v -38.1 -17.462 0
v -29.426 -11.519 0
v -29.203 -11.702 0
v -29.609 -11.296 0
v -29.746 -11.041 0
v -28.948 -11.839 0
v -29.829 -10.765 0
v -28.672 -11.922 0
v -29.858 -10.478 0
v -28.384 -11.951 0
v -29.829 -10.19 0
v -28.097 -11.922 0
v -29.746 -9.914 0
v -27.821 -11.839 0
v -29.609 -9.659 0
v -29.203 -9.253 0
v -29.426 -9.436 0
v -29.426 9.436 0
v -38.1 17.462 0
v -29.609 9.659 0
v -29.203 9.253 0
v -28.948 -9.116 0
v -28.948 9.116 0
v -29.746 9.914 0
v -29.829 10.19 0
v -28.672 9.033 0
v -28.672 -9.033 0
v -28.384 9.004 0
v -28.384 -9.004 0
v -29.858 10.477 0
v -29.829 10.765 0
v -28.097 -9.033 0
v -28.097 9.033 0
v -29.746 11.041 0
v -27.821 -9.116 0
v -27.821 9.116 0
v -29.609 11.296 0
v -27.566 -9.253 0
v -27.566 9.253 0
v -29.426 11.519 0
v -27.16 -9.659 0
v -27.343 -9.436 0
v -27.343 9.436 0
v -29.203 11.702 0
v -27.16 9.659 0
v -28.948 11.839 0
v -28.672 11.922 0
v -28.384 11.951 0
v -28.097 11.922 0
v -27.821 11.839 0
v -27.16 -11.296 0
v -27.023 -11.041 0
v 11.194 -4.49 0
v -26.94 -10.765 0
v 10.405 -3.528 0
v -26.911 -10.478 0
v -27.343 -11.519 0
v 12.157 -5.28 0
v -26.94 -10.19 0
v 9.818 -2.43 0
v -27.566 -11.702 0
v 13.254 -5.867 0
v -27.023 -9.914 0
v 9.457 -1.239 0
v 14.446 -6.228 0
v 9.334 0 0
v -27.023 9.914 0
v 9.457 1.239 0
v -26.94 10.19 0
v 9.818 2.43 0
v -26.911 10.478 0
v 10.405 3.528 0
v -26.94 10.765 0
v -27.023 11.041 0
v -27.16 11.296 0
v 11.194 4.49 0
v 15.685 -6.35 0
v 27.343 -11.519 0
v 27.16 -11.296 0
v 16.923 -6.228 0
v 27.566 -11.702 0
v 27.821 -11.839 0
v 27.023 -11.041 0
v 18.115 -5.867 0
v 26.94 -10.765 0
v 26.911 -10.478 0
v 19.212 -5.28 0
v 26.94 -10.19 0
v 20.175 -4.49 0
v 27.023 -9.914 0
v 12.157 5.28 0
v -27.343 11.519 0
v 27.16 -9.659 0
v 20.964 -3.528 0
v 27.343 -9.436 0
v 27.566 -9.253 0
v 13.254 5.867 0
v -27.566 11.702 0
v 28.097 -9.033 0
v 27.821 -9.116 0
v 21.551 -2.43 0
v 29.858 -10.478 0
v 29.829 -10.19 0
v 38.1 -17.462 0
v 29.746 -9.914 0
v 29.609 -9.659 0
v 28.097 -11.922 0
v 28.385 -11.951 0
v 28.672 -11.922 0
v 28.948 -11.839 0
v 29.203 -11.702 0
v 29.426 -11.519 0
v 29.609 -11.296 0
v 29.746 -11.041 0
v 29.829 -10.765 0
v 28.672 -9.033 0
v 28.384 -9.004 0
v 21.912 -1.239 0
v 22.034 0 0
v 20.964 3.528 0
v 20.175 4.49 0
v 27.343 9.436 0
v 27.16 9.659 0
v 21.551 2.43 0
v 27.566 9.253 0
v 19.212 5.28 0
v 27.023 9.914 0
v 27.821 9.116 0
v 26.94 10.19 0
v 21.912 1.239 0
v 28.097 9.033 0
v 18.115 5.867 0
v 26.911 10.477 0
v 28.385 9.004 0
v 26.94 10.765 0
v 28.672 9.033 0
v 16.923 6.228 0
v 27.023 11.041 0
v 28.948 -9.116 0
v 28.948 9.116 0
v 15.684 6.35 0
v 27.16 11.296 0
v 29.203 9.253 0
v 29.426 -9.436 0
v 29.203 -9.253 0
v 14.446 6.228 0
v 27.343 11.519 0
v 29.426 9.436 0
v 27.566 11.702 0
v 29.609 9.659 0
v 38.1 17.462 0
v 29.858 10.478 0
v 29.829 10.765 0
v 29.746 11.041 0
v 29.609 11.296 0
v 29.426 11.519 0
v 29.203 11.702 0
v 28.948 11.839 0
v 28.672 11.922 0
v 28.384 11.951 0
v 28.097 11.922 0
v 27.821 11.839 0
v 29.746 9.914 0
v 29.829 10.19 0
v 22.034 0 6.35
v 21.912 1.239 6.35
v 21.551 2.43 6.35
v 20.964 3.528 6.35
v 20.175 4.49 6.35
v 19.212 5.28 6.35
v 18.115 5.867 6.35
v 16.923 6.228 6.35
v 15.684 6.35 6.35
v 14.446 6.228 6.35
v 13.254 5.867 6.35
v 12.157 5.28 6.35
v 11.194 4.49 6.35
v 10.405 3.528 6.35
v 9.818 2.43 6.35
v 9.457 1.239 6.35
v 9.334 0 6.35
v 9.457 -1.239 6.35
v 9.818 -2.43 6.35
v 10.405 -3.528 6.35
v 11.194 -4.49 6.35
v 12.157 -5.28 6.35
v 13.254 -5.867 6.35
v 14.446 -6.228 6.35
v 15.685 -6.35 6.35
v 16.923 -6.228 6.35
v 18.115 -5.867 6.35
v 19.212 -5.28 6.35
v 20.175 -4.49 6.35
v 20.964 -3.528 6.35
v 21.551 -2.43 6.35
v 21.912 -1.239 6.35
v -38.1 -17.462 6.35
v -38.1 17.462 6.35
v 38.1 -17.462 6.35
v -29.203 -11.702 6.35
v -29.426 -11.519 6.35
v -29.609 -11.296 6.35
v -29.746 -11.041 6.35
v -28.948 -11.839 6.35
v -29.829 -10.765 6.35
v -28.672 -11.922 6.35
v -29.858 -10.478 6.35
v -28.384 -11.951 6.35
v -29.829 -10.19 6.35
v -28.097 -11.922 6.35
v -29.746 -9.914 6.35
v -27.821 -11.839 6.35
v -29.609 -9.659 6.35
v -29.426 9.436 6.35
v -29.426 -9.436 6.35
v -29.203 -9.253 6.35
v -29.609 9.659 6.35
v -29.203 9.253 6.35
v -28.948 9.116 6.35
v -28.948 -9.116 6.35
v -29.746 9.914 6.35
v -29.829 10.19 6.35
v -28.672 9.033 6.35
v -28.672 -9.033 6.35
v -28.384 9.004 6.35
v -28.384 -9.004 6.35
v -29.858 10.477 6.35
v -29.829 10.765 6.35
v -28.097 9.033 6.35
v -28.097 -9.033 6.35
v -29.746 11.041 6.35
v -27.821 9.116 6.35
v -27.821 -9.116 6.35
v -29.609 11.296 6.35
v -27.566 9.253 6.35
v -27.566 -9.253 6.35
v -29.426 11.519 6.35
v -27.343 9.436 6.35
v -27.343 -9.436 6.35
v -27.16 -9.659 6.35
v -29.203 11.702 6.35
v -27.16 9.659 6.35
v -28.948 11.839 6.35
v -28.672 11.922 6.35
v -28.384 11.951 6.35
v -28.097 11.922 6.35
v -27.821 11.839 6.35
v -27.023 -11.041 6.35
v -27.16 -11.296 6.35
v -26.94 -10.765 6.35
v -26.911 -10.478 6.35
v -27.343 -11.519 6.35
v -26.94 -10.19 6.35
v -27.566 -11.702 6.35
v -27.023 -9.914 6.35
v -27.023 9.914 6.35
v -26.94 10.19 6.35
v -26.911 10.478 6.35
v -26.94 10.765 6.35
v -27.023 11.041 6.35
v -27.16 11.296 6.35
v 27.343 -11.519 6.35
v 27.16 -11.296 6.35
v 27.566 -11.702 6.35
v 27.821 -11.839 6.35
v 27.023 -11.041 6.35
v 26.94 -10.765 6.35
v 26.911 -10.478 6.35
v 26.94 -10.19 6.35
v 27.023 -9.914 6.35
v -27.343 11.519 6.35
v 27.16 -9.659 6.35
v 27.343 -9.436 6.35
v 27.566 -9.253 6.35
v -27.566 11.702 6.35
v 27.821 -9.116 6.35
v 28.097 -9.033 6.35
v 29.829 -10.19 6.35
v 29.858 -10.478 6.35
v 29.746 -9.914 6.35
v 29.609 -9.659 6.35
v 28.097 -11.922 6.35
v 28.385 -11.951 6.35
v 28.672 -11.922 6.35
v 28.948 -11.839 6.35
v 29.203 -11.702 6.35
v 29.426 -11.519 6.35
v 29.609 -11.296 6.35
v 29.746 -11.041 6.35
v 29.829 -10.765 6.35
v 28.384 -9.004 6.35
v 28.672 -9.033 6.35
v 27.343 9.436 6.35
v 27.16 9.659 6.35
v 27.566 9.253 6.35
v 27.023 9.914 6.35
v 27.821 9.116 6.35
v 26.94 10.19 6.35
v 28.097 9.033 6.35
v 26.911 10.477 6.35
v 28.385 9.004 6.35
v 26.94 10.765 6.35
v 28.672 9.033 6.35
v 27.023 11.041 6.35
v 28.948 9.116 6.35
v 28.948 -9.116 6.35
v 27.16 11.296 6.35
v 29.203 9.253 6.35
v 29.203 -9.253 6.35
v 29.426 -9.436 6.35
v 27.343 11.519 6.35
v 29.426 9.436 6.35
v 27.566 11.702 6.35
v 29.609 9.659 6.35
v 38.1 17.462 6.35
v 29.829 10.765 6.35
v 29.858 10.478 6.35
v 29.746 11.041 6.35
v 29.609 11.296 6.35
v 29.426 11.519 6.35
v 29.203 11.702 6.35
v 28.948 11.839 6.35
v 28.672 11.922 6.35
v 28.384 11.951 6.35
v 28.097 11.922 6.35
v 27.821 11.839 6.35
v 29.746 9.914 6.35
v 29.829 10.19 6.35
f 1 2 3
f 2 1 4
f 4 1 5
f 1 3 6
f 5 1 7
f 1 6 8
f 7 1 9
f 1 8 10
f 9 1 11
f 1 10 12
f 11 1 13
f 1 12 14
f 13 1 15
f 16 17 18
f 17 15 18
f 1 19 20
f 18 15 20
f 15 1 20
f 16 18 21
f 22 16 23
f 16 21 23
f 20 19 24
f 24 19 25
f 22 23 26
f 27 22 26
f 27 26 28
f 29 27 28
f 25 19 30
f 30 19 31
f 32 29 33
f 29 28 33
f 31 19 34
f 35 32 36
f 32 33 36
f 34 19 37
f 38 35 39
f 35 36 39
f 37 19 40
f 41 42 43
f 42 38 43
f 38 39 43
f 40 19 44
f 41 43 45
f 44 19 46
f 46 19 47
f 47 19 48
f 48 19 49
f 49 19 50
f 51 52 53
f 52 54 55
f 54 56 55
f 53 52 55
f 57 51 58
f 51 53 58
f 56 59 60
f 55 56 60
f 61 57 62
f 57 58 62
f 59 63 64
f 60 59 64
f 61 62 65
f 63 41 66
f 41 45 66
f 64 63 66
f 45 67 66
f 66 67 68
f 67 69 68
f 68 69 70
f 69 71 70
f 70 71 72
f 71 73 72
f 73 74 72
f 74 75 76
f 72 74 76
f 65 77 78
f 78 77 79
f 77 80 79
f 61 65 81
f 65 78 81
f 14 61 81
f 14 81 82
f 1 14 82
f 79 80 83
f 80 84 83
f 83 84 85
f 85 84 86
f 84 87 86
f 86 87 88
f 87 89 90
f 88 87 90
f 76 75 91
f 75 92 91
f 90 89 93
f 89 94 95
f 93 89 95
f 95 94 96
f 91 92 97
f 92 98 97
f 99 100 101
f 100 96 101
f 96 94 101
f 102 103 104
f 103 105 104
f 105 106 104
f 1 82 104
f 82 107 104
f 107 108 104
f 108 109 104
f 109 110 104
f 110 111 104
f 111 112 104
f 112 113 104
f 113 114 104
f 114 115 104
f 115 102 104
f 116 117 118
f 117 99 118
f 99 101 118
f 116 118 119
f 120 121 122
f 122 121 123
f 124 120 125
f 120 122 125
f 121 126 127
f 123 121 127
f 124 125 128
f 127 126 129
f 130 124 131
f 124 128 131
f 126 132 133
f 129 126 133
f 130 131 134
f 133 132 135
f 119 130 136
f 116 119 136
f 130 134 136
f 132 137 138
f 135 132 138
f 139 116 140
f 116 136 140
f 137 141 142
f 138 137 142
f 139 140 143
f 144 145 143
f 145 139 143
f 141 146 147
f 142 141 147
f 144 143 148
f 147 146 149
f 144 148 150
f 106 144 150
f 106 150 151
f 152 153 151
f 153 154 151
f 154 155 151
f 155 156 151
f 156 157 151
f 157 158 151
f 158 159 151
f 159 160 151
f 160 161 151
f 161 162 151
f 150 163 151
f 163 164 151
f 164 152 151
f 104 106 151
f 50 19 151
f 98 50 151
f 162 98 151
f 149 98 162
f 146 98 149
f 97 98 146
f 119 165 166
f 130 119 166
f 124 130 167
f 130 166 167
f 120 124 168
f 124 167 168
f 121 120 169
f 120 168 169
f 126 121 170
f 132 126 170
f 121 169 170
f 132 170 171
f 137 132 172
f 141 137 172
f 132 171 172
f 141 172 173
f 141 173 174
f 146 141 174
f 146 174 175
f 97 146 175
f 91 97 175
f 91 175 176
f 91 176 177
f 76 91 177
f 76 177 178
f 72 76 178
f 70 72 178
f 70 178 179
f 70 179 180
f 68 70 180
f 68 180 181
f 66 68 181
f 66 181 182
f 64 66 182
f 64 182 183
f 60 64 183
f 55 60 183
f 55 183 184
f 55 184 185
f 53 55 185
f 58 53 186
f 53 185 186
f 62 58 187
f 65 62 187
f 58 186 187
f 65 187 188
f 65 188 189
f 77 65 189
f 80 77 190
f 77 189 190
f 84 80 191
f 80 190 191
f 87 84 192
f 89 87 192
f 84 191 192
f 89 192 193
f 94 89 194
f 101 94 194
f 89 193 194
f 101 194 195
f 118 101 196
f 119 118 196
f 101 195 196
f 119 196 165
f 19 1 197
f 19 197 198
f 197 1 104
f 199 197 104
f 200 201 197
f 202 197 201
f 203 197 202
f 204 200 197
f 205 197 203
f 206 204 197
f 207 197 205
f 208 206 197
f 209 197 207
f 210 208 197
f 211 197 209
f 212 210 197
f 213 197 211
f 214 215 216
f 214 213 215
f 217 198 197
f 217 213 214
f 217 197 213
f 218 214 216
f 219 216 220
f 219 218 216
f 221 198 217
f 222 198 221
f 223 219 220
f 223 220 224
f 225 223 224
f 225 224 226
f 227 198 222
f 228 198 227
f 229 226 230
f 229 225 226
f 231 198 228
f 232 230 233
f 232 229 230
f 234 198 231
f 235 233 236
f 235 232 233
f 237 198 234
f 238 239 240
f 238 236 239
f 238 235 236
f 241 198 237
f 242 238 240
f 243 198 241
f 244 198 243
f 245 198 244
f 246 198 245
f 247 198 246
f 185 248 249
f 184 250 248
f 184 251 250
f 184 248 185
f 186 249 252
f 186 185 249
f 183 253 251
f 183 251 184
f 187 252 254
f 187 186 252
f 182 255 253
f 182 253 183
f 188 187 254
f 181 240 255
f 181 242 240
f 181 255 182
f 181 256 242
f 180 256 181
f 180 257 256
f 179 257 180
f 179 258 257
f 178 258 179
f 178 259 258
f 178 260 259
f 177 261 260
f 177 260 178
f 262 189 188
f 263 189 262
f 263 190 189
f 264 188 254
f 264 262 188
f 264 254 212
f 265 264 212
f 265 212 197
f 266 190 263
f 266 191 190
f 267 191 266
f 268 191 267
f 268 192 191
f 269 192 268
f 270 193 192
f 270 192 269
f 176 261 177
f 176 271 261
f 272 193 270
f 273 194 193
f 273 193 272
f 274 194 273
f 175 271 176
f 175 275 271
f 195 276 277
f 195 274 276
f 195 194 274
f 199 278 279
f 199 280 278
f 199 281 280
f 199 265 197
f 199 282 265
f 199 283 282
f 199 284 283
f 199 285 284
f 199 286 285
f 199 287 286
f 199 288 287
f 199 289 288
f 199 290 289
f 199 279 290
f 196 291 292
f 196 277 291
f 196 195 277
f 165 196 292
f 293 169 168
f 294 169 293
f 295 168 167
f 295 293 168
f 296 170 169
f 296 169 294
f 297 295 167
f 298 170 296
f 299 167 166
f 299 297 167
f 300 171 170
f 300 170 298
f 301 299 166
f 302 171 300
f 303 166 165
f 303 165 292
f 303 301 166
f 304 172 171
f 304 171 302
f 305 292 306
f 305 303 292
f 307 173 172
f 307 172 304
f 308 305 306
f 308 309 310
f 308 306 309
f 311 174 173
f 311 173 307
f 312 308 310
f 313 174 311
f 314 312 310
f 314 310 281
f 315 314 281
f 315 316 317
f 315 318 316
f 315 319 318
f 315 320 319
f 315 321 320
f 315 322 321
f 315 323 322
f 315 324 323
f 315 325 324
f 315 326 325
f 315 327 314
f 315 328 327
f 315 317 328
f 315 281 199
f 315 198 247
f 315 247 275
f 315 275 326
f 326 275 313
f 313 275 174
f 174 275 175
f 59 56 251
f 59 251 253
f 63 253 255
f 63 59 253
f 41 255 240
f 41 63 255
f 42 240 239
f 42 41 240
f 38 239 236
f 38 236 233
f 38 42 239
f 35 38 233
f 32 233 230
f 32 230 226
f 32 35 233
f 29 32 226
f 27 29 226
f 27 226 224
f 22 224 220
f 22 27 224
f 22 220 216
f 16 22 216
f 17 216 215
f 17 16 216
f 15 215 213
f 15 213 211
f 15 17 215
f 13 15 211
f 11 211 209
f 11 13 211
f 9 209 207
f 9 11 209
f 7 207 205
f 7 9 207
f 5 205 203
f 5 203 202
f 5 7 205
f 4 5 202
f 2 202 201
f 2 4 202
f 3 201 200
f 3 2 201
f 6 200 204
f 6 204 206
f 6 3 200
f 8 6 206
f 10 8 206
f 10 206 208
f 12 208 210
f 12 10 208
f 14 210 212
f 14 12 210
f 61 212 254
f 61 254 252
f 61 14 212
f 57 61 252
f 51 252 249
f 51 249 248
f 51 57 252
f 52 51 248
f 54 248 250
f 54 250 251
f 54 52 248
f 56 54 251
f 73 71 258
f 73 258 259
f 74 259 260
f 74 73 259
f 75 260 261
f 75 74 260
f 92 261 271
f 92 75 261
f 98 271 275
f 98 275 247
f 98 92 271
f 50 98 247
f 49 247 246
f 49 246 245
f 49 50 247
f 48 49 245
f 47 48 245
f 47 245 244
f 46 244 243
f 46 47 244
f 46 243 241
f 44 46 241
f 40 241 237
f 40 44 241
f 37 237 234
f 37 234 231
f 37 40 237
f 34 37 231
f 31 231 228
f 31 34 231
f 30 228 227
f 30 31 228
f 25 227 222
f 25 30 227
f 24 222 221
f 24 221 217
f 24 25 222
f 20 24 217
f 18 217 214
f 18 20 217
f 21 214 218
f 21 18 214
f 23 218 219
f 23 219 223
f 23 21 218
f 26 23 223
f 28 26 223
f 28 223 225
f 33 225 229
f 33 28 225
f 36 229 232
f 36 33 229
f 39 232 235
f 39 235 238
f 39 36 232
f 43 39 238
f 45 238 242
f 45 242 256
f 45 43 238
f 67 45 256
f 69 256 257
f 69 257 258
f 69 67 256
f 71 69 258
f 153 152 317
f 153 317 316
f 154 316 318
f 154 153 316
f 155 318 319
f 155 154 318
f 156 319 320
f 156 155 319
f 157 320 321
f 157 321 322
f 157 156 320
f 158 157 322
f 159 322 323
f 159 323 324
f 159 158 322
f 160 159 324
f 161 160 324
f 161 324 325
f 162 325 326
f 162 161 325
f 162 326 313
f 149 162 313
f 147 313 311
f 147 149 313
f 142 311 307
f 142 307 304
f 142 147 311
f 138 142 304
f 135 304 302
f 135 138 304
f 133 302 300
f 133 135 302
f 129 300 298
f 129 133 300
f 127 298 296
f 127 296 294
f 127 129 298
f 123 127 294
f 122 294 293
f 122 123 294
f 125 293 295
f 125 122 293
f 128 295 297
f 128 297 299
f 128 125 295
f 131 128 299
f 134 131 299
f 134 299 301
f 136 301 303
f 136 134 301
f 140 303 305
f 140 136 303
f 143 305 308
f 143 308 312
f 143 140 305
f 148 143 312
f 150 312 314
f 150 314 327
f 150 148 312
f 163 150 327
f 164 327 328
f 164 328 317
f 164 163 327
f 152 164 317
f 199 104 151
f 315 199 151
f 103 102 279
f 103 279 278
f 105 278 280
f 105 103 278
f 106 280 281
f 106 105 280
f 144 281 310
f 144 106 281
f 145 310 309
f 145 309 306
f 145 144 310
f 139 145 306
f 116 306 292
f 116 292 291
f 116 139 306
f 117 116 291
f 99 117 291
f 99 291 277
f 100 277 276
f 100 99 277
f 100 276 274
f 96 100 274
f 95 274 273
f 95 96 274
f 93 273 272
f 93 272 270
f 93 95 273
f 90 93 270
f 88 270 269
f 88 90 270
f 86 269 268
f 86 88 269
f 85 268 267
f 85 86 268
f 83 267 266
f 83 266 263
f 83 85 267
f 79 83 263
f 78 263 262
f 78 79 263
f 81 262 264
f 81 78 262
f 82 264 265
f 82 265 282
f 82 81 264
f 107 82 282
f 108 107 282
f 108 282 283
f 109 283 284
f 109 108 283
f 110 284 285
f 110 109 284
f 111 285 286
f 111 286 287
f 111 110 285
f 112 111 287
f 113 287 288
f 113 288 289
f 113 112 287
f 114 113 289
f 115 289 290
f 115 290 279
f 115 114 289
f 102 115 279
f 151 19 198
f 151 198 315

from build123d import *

# Parameters (mm, degrees)
SKETCH1_W               = 76.2
SKETCH1_H               = 34.925
BOSS_EXTRUDE1_DEPTH     = 6.35
ADVANCEDHOLE1_OUTLINE_R = 1.4732
ADVANCEDHOLE1_DEPTH     = 6.35
CUT_EXTRUDE1_REACH      = 44.39
SKETCH5_R               = 6.35


# Read off the part's stored shape, not the designer's step: AdvancedHole1
with BuildPart() as part:
    # Sketch1 → Boss-Extrude1 (new body)
    with BuildSketch(Plane.XY):
        Rectangle(SKETCH1_W, SKETCH1_H)
    extrude(amount=BOSS_EXTRUDE1_DEPTH)

    # AdvancedHole1 outline → AdvancedHole1 (cut)
    with BuildSketch(Plane.XY):
        with Locations((28.3845, 10.4775)):
            Circle(ADVANCEDHOLE1_OUTLINE_R)
        with Locations((28.3845, -10.4775)):
            Circle(ADVANCEDHOLE1_OUTLINE_R)
        with Locations((-28.3845, -10.4775)):
            Circle(ADVANCEDHOLE1_OUTLINE_R)
        with Locations((-28.3845, 10.4775)):
            Circle(ADVANCEDHOLE1_OUTLINE_R)
    extrude(amount=ADVANCEDHOLE1_DEPTH, mode=Mode.SUBTRACT)

    # Sketch5 → Cut-Extrude1 (cut, up to next)
    with BuildSketch(Plane.XY.offset(6.35), mode=Mode.PRIVATE) as cut_extrude1_sk1:
        with Locations((15.6845, 0)):
            Circle(SKETCH5_R)
    cut_extrude1_tool1 = extrude(cut_extrude1_sk1.sketch, amount=-CUT_EXTRUDE1_REACH, mode=Mode.PRIVATE) & part.part
    add(cut_extrude1_tool1.solids().sort_by_distance((15.6845, 0, 6.35))[0], mode=Mode.SUBTRACT)


solid = part.part
